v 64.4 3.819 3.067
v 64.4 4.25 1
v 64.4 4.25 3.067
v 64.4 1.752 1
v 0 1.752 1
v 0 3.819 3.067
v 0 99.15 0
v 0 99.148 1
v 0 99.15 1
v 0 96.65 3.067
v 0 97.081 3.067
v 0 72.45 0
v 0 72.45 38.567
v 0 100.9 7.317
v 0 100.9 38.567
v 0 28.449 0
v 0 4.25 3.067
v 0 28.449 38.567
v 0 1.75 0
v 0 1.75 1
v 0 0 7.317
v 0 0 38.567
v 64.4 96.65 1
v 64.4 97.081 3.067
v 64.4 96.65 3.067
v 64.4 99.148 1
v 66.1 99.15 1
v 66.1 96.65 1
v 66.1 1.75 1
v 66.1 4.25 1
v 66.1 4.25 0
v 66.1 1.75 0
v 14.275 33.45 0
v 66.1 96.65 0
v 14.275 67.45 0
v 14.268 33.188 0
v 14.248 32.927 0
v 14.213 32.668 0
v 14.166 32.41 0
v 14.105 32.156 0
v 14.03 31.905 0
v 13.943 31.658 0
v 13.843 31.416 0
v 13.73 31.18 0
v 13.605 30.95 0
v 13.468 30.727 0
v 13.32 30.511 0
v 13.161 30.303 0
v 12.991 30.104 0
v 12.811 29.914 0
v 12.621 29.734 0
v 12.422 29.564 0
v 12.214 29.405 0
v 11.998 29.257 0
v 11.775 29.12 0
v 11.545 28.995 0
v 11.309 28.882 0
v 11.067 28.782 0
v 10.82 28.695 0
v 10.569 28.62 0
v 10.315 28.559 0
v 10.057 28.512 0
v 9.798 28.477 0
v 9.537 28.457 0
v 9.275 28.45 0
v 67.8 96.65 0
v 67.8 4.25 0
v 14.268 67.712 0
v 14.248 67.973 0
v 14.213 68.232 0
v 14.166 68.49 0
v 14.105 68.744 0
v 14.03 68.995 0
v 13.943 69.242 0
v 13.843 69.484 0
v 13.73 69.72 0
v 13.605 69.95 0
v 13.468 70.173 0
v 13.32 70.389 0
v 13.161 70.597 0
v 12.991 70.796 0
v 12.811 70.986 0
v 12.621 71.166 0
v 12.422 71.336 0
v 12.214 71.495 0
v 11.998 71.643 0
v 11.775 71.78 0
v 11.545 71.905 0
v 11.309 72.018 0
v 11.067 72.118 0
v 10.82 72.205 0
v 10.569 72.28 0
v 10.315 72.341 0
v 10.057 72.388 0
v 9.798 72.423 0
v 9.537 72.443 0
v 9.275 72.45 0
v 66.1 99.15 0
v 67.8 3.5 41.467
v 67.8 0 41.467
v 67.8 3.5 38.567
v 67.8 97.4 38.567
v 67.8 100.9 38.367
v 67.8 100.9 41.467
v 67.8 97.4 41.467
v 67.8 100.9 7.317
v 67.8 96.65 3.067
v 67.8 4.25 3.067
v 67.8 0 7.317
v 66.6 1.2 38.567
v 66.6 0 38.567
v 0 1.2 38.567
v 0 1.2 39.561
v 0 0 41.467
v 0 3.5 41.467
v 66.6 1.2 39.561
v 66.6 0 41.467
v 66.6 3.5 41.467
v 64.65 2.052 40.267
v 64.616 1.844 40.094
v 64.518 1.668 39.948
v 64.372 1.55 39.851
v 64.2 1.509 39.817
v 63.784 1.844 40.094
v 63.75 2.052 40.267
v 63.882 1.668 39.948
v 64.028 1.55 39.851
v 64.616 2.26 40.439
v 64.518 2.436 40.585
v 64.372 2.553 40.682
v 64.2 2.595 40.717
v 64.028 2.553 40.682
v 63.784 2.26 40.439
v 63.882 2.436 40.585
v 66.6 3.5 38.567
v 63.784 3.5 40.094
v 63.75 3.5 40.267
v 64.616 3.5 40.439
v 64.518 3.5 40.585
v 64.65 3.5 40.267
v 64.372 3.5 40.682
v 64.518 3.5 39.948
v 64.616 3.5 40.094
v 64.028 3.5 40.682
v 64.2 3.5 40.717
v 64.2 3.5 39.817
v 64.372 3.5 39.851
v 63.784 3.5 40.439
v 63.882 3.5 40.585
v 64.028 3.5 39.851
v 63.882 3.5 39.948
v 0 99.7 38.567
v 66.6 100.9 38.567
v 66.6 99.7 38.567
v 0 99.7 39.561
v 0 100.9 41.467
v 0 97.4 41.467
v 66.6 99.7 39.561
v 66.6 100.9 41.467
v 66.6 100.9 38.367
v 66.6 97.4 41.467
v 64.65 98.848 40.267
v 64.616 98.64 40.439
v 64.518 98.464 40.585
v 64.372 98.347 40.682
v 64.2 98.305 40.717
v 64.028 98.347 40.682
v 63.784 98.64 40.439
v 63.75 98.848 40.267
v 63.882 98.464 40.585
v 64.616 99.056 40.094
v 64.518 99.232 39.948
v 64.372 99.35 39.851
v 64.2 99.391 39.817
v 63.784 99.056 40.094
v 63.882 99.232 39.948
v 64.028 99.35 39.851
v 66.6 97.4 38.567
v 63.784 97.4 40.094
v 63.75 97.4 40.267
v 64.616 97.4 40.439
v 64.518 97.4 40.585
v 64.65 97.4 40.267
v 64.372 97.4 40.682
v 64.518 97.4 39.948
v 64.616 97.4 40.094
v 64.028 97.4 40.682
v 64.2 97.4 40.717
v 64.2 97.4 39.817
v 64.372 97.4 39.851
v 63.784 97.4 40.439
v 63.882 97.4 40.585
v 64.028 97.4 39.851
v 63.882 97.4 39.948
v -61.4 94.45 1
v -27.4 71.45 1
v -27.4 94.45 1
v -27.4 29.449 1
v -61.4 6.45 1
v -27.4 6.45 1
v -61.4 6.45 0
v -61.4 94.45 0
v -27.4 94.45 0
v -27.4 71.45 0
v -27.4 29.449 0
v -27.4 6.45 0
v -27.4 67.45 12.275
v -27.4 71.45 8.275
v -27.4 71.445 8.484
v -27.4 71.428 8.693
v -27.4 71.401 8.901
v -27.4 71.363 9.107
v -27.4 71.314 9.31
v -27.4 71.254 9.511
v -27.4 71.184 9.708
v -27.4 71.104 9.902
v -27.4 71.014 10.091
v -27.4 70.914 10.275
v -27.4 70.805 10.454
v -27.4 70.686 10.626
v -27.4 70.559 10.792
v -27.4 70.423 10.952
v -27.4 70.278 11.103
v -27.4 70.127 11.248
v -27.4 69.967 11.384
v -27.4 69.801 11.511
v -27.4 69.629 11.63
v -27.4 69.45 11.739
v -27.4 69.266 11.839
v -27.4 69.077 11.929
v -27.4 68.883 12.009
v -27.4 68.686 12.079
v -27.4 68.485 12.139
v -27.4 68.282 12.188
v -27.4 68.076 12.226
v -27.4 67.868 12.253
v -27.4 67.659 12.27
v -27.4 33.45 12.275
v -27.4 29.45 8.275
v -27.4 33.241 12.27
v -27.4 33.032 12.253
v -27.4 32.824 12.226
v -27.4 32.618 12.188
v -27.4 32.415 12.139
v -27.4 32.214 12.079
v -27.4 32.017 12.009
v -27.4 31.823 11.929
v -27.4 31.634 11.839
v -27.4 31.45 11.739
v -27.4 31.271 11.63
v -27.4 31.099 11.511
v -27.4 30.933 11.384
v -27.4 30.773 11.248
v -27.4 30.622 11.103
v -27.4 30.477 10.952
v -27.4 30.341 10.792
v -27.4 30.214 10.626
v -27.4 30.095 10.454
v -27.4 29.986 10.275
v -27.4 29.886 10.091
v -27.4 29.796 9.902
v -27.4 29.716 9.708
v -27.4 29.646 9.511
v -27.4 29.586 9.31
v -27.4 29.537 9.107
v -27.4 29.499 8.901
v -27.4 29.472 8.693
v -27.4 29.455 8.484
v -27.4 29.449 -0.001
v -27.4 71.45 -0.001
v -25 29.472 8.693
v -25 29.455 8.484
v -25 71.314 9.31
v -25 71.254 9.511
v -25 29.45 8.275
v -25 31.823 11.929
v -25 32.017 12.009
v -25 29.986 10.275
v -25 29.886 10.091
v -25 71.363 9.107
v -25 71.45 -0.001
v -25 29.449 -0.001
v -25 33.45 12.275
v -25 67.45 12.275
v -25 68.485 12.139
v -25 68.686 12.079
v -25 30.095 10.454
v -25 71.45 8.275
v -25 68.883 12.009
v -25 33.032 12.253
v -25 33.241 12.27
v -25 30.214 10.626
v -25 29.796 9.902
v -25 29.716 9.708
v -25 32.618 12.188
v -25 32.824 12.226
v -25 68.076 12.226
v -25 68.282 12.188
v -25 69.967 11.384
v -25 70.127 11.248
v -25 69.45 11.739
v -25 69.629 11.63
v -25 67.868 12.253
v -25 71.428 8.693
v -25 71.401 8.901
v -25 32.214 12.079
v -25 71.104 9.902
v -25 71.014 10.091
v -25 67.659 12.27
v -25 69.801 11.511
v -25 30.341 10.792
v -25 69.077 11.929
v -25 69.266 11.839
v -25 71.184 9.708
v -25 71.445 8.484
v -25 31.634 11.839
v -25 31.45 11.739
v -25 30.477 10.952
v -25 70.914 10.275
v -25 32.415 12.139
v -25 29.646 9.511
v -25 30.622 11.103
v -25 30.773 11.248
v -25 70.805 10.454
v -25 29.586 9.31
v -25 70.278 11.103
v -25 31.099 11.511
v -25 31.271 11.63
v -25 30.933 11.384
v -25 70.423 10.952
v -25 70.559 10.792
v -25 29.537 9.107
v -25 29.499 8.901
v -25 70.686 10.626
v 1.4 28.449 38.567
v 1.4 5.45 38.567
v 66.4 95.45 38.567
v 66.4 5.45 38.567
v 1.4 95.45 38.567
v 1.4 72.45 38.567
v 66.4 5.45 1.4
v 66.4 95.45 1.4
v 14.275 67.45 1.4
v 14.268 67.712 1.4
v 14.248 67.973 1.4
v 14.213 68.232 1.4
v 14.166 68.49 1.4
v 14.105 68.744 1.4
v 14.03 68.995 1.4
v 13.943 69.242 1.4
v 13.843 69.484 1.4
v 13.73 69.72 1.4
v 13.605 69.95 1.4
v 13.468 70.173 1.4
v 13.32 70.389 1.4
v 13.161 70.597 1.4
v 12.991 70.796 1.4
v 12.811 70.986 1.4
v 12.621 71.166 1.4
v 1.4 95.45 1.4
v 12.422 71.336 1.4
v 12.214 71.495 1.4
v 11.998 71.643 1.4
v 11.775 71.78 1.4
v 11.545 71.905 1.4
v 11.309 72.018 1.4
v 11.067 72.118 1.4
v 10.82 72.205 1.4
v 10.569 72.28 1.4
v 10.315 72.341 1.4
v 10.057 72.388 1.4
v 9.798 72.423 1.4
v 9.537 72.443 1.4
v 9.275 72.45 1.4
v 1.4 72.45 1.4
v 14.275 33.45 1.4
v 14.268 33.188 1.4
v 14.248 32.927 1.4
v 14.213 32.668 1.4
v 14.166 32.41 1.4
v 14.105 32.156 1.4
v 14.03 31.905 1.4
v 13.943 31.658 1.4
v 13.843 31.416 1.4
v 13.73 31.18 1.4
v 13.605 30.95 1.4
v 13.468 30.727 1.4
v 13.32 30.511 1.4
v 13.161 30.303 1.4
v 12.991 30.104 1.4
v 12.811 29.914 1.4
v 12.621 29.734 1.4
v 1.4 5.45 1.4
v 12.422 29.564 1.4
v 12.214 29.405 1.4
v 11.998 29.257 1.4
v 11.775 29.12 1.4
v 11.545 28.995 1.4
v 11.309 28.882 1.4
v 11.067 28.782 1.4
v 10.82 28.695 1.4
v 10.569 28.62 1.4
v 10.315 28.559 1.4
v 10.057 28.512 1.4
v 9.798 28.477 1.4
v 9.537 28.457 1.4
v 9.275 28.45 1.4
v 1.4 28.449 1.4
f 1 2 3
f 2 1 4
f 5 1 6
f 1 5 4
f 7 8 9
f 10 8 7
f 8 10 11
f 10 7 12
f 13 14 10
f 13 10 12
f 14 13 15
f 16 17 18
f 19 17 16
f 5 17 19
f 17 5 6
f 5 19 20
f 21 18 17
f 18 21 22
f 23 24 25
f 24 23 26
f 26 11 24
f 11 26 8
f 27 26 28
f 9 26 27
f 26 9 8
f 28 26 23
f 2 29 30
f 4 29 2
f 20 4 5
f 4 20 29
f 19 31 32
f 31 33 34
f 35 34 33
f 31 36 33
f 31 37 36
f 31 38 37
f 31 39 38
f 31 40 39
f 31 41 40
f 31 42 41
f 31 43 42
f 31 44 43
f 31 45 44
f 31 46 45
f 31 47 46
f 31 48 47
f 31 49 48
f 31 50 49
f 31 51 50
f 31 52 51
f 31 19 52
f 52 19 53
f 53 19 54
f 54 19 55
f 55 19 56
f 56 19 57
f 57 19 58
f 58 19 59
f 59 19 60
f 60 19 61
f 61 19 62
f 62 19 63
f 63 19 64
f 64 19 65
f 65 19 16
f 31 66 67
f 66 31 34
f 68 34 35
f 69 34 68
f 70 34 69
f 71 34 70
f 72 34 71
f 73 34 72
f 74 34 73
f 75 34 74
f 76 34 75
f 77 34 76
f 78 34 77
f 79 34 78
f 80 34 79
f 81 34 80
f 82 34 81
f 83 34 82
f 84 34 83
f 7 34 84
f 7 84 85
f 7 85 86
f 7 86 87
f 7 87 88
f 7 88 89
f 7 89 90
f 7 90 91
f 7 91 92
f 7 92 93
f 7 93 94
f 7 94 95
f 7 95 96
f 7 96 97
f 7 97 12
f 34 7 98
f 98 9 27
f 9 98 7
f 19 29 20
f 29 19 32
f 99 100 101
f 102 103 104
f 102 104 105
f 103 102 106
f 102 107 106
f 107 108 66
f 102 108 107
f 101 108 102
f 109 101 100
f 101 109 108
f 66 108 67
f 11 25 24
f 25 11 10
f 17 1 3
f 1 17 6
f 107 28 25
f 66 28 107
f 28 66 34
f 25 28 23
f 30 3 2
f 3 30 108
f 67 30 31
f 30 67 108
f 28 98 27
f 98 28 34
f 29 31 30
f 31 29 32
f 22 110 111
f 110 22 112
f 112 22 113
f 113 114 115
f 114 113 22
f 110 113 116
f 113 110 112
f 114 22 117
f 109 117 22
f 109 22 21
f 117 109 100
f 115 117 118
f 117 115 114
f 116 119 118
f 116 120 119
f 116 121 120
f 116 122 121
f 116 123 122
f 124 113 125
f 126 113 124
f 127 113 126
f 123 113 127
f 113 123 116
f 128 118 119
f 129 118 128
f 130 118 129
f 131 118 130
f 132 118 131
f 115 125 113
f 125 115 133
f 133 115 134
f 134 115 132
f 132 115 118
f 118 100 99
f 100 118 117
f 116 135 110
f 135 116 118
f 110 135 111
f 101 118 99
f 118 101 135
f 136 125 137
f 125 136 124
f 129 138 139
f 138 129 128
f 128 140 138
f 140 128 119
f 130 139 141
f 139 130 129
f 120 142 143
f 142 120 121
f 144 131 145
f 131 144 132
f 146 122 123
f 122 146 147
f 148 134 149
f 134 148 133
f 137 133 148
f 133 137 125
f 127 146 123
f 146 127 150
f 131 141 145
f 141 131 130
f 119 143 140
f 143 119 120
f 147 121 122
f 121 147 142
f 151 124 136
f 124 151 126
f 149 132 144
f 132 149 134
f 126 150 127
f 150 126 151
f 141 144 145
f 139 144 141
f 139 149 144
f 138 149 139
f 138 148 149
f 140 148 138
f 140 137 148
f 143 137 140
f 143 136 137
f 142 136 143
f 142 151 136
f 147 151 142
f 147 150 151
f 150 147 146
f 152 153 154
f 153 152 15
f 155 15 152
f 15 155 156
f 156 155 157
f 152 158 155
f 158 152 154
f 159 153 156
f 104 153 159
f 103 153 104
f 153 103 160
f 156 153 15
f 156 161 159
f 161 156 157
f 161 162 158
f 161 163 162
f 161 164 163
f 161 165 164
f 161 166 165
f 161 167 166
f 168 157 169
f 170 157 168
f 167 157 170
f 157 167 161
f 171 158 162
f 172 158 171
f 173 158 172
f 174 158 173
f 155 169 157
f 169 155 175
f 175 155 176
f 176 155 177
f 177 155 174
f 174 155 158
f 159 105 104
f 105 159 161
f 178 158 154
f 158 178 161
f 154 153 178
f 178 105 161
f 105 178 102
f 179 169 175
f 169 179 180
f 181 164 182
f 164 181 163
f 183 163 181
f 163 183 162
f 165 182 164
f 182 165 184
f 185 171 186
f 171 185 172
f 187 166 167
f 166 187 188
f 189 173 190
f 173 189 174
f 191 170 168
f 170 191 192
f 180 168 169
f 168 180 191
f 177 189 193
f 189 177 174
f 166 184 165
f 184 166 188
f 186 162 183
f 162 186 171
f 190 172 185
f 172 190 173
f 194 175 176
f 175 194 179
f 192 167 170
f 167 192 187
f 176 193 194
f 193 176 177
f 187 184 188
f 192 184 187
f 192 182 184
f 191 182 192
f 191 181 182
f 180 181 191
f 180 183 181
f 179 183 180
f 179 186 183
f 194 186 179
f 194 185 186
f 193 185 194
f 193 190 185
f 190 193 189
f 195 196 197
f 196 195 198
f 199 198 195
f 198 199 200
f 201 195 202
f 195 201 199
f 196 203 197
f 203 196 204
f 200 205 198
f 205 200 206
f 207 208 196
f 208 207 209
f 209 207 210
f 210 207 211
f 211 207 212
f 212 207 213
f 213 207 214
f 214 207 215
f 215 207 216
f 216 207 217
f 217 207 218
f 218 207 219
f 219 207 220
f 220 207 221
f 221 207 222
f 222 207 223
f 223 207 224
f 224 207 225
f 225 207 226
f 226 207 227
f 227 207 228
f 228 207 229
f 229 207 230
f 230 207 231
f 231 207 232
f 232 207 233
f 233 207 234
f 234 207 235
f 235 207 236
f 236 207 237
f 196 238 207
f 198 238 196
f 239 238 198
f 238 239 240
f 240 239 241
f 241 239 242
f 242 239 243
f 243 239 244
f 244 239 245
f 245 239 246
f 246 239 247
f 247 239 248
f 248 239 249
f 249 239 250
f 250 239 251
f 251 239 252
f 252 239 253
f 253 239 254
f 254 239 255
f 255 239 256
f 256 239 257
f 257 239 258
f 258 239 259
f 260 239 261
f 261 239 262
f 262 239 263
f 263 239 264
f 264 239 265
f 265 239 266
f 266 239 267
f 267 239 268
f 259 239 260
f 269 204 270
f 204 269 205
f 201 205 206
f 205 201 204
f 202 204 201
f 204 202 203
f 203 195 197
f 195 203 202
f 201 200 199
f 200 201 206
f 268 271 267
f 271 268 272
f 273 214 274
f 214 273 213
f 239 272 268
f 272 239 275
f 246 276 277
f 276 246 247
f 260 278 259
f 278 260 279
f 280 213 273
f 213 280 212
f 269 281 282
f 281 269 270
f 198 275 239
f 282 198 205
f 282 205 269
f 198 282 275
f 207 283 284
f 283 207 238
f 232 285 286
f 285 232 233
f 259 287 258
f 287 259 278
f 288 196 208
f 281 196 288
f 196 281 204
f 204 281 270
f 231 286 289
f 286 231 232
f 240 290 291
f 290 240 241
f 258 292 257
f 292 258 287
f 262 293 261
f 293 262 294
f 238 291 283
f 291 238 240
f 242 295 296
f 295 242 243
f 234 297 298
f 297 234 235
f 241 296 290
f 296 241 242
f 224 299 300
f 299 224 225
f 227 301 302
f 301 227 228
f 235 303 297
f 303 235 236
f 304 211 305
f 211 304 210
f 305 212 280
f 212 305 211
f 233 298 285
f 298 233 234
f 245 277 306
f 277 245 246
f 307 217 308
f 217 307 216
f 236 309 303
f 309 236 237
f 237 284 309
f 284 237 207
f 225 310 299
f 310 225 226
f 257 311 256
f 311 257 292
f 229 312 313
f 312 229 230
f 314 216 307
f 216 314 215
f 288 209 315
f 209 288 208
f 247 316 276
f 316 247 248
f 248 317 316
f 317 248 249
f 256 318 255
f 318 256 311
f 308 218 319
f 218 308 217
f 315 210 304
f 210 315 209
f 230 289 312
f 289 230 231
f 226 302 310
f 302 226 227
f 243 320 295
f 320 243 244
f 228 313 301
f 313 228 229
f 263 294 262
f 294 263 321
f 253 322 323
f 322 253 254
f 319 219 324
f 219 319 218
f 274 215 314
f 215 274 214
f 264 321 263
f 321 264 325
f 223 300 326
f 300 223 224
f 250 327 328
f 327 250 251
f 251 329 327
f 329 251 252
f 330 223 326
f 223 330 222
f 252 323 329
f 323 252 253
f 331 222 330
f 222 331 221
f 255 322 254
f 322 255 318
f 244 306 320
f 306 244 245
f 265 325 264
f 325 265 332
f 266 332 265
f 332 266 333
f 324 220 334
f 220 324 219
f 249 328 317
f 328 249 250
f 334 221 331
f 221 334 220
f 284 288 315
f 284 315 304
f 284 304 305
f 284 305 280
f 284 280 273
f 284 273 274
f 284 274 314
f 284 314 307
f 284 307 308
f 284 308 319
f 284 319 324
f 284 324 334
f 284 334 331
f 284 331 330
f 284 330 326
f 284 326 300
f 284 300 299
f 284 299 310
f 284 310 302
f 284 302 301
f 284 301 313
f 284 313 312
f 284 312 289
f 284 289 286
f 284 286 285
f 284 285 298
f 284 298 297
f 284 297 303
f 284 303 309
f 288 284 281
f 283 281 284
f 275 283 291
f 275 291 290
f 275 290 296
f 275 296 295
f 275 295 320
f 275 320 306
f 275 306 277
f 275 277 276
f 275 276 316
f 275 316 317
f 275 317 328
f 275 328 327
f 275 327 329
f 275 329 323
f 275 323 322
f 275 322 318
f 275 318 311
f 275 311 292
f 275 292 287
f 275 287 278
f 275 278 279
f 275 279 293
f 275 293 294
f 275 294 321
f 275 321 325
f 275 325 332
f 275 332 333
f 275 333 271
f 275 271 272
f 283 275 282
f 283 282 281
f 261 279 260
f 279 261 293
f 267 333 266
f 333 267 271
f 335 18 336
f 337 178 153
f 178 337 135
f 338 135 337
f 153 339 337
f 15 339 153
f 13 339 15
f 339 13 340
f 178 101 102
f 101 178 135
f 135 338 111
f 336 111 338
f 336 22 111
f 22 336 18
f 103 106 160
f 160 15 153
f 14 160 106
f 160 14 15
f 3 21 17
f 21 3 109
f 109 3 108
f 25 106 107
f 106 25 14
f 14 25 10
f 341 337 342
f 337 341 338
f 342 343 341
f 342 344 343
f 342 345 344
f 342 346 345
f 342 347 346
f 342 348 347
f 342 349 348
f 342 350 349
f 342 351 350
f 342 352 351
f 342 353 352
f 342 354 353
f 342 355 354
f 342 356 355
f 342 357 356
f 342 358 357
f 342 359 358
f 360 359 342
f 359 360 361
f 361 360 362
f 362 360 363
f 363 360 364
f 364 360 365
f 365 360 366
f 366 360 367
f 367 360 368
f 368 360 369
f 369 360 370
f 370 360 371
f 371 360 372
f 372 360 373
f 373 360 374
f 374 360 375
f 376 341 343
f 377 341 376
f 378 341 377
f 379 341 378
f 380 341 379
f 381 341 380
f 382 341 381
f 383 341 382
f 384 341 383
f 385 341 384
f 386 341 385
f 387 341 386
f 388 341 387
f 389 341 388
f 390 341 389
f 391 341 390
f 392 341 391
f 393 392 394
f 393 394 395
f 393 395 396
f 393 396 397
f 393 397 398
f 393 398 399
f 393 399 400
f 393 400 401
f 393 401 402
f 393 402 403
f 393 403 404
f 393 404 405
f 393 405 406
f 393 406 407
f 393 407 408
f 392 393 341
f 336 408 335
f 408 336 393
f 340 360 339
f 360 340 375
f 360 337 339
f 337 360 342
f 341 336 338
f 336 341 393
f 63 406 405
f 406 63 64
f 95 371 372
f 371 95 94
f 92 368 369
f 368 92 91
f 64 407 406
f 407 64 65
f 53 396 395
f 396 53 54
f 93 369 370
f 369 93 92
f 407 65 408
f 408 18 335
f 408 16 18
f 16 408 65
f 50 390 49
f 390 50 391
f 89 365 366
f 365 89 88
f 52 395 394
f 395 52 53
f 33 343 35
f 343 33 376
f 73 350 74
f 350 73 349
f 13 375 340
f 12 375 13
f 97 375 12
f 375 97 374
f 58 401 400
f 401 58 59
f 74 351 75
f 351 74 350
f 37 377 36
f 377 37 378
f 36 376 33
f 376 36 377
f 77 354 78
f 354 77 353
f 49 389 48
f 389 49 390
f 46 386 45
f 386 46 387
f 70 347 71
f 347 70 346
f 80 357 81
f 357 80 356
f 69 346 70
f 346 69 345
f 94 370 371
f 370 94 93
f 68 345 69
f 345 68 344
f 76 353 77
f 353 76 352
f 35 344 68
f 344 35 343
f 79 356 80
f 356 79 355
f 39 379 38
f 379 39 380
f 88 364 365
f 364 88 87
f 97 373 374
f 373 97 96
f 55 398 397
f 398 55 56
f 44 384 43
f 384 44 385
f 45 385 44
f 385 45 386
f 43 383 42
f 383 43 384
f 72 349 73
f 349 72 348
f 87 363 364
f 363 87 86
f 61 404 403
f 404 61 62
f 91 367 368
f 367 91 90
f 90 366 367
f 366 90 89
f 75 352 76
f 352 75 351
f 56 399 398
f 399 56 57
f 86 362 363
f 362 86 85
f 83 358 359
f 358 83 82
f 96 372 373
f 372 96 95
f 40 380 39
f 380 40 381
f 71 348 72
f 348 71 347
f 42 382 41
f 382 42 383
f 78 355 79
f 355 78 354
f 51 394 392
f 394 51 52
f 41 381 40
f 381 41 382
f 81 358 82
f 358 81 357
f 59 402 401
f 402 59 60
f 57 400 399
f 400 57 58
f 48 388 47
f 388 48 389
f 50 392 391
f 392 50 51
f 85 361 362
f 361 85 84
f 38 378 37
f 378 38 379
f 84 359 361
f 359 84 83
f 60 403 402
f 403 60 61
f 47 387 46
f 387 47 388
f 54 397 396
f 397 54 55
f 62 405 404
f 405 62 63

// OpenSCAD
/*
 * Customizable Card Boxes and Lids 
 * Version: 0.4 -- 2019-01-14
 * Author: Mark Phaedrus
 * License: Creative Commons Attribution-ShareAlike 3.0 Unported License
 *          see http://creativecommons.org/licenses/by-sa/3.0/
 * URL:     https://www.thingiverse.com/thing:2954310
 
 * Remix Of: Customizable Board Game Card Storage with Multiple Sizes
 * Author:  Erwan Loisant
 * License: Creative Commons Attribution-ShareAlike 3.0 Unported License
 *          see http://creativecommons.org/licenses/by-sa/3.0/
 * URL:     https://www.thingiverse.com/thing:2923849
 * 
 * Remix Of: Customizable Board Game Card Storage
 * Author:  Jean Philippe Neumann
 * License: Creative Commons Attribution-ShareAlike 3.0 Unported License
 *          see http://creativecommons.org/licenses/by-sa/3.0/
 * URL:     http://www.thingiverse.com/thing:94611
 */
 
// MakerBot customizer settings:
// preview[view:south east, tilt:top diagonal]

/*
 * parameters
 */

/* [Basics] */

// What is the length of your cards (the longer dimension) in millimeters?
cardLength = 88;
// What is the width of your cards in millimeters?
cardWidth = 63;

// How should I position the boxes for printing? Printing them flat lets them print without support (if you use the angled lock). Standing them on their sides will let you fit more boxes on the build plate, but requires a lot of support.
boxPositioning = 0; // [0:Flat,1:On their sides]

// What style of lock should I use to let the boxes be stacked together and keep the lids on? The square lock uses 90-degree angles; it's strong, but winds up looking messy (or requires support) if you print the boxes flat. The angled lock is experimental and a bit weaker; but it's strong enough for most uses, and it can be printed without support in either position.
lockStyle = 1; // [0: Square lock,1:Angled lock] 

// How tightly should the boxes and lids fit together? The right value is highly dependent on your printer. Start with a value of 0. Are the locks too tight to slide together? Try decreasing the tightness by 1. Are the locks so loose that they slide apart on their own? Try increasing the tightness by 1.
fitTightness = 0; // [-5:1:5]

// What is the thickness of the stack of cards you're keeping in the first box, in millimeters?
cardBox1Thickness = 35;

// Should the box have a grab hole in the side to let you draw cards from the box? If so, do you also want a plug to cover the grab hole for storage?
cardBox1GrabHole = 2; // [2:Hole with plug,1:Hole without plug,0:No]

// What label should I put on the two narrow ends of the first box? (Leave this blank if you don't want a label there.)
cardBox1EndLabel = "";

// What label should I put on the long side of the first box opposite the grab hole? (Leave this blank if you don't want a label there.)
cardBox1SideLabel = "";

// Should the first card box have a key on the bottom? (Choosing this will make the box simpler, but won't let you lock any other boxes to the bottom of this one.)
cardBox1Key = 1; // [1:Bottom key,0:No bottom key]

// What label should I put on the lid? (Leave this blank if you don't want a label.)
lidLabel = "";

// What part should be displayed in the preview?
part="B1"; // [B1:Box 1,L1:Lid,B2:Box 2,B3:Box 3,B4:Box 4,B5:Box 5]

/* [Box 2 (if you want it)] */

// What is the thickness of the stack of cards you're keeping in the second box, in millimeters? (Leave this zero if you don't want a second box.)
cardBox2Thickness = 0;

// Should the box have a grab hole in the side to let you draw cards from the box? If so, do you also want a plug to cover the grab hole for storage?
cardBox2GrabHole = 2; // [2:Hole with plug,1:Hole without plug,0:No]

// What label should I put on the two narrow ends of the second box? (Leave this blank if you don't want a label there.)
cardBox2EndLabel = "";

// What label should I put on the long side of the second box opposite the grab hole? (Leave this blank if you don't want a label there.)
cardBox2SideLabel = "";

// Should the box have a key on the bottom? (Choosing this will make the box simpler, but won't let you lock any other boxes to the bottom of this one.)
cardBox2Key = 1; // [1:Bottom key,0:No bottom key]

/* [Box 3 (if you want it)] */

// What is the thickness of the stack of cards you're keeping in the third box, in millimeters? (Leave this zero if you don't want a third box.)
cardBox3Thickness = 0;

// Should the box have a grab hole in the side to let you draw cards from the box? If so, do you also want a plug to cover the grab hole for storage?
cardBox3GrabHole = 2; // [2:Hole with plug,1:Hole without plug,0:No]

// What label should I put on the two narrow ends of the third box? (Leave this blank if you don't want a label there.)
cardBox3EndLabel = "";

// What label should I put on the long side of the third box opposite the grab hole? (Leave this blank if you don't want a label there.)
cardBox3SideLabel = "";

// Should the box have a key on the bottom? (Choosing this will make the box simpler, but won't let you lock any other boxes to the bottom of this one.)
cardBox3Key = 1; // [1:Bottom key,0:No bottom key]

/* [Box 4 (if you want it)] */

// What is the thickness of the stack of cards you're keeping in the fourth box, in millimeters? (Leave this zero if you don't want a fourth box.)
cardBox4Thickness = 0;

// Should the box have a grab hole in the side to let you draw cards from the box? If so, do you also want a plug to cover the grab hole for storage?
cardBox4GrabHole = 2; // [2:Hole with plug,1:Hole without plug,0:No]

// What label should I put on the two narrow ends of the fourth box? (Leave this blank if you don't want a label there.)
cardBox4EndLabel = "";

// What label should I put on the long side of the first box opposite the grab hole? (Leave this blank if you don't want a label there.)
cardBox4SideLabel = "";

// Should the box have a key on the bottom? (Choosing this will make the box simpler, but won't let you lock any other boxes to the bottom of this one.)
cardBox4Key = 1; // [1:Bottom key,0:No bottom key]

/* [Box 5 (if you want it)] */

// What is the thickness of the stack of cards you're keeping in the fifth box, in millimeters? (Leave this zero if you don't want a fifth box.)
cardBox5Thickness = 0;

// Should the box have a grab hole in the side to let you draw cards from the box? If so, do you also want a plug to cover the grab hole for storage?
cardBox5GrabHole = 2; // [2:Hole with plug,1:Hole without plug,0:No]

// What label should I put on the two narrow ends of the fifth box? H(Leave this blank if you don't want a label there.)
cardBox5EndLabel = "";

// What label should I put on the long side of the fifth box opposite the grab hole? (Leave this blank if you don't want a label.)
cardBox5SideLabel = "";

// Should the box have a key on the bottom? (Choosing this will make the box simpler, but won't let you lock any other boxes to the bottom of this one.)
cardBox5Key = 1; // [1:Bottom key,0:No bottom key]

// Hiding all the parameters below from the customizer for now, because I haven't verified that they all work correctly with the new lock/key style.
/* [Hidden] */

partType = part[0];
partIndex = atoi(part[1]) - 1;

longWallStrength = 1.4;
shortWallStrength = 1.2;
bottomWallStrength = 1.4;

// thickness of the lower part of the lock mechanism
lowerLockY = 1.2;
// height of the lower part of the lock mechanism
lowerLockZ = 1.7;
// thickness of the upper part of the lock mechanism
upperLockY = 3.5;
// height of the upper part of the lock mechanism
upperLockZ = 1.2;
// how high is the part of the lid that slides in the locks rail
keyRailZLid = 1.0;
// how high is the part of the holders body that slides in the locks rail
keyRailZBody = 1.0;

// How far the text on the lid is embedded into the lid
lidTextDepth = 0.8;

// How far the text on the boxes is embedded into the box
holderTextDepth = 1.2;

// how thick the bit of plastic is that blocks the end of the lock's rail
stopBitStrength = 1.2;
// the "lock nub" is a tiny bump near the end of the lock's rail that makes other holders or lids snap in. This variable sets the size of that nub.
lockNubRadius = 0.45;
// position of the "lock nub"
lockNubDistanceToCorner = 3*stopBitStrength;

// how much extra space to leave around cards
spaceAroundCard = 1;
// how strong the lid's grip is
lidGripStrength = 3;

// **********
// * BEGIN INCLUDED CODE:
// * DisplayErrorsInPreview by kickahaota (https://www.thingiverse.com/thing:2918930)
// **********
// Convert strings to floating point for compatibility with Customizer
// Conversion code by jesse (https://www.thingiverse.com/thing:2247435)
function atoi(str, base=10, i=0, nb=0) =
	i == len(str) ? (str[0] == "-" ? -nb : nb) :
	i == 0 && str[0] == "-" ? atoi(str, base, 1) :
	atoi(str, base, i + 1,
		nb + search(str[i], "0123456789ABCDEF")[0] * pow(base, len(str) - i - 1));

function substr(str, pos=0, len=-1, substr="") =
	len == 0 ? substr :
	len == -1 ? substr(str, pos, len(str)-pos, substr) :
	substr(str, pos+1, len-1, str(substr, str[pos]));
    
function atof(str) = len(str) == 0 ? 0 : let( expon1 = search("e", str), expon = len(expon1) ? expon1 : search("E", str)) len(expon) ? atof(substr(str,pos=0,len=expon[0])) * pow(10, atoi(substr(str,pos=expon[0]+1))) : let( multiplyBy = (str[0] == "-") ? -1 : 1, str = (str[0] == "-" || str[0] == "+") ? substr(str, 1, len(str)-1) : str, decimal = search(".", str), beforeDecimal = decimal == [] ? str : substr(str, 0, decimal[0]), afterDecimal = decimal == [] ? "0" : substr(str, decimal[0]+1) ) (multiplyBy * (atoi(beforeDecimal) + atoi(afterDecimal)/pow(10,len(afterDecimal)))); 

function isdef(x) = (x != undef);
function isnumeric(x) = isdef(x) && ( x + 0 == x);
function isinteger(x) = isdef(x) && ( floor(x) == x) ;
function aorftof(numorstr) = (numorstr + 1 == undef) ? atof(numorstr) : numorstr;
function aoritoi(numorstr) = (numorstr + 1 == undef) ? atoi(numorstr) : numorstr;

module showfailedassertions() {
    translate([0,0,0]) linear_extrude(height=1) text(text="Please make these parameter changes:");
    for(idx = [0 : len(assertions)-1]) {
        if (!assertions[idx][0]) {
            translate([0, -12*idx, 0]) linear_extrude(height=1) text(text=assertions[idx][1]);
        }
    }
}

function anyassertionfailed(idx = len(assertions)-1) = (!(assertions[idx][0]) ? 1 : (idx <= 0) ? 0 : anyassertionfailed(idx-1)); 

// **********
// * END INCLUDED CODE:
// * DisplayErrorsInPreview by kickahaota (https://www.thingiverse.com/thing:2918930)
// **********

// Customizer may have converted numeric parameters into strings; turn them back into numbers
cardY = aorftof(cardLength);
cardX = aorftof(cardWidth);
cardStackZs = [cardBox1Thickness,cardBox2Thickness,cardBox3Thickness,cardBox4Thickness,cardBox5Thickness];
holderEndLabels = [cardBox1EndLabel,cardBox2EndLabel,cardBox3EndLabel,cardBox4EndLabel,cardBox5EndLabel];
holderSideLabels = [cardBox1SideLabel,cardBox2SideLabel,cardBox3SideLabel,cardBox4SideLabel,cardBox5SideLabel];
holderUseGrabHoles = [(cardBox1GrabHole > 0), (cardBox2GrabHole > 0), (cardBox3GrabHole > 0), (cardBox4GrabHole > 0), (cardBox5GrabHole > 0)];
holderUseGrabHolePlugs = [(cardBox1GrabHole == 2), (cardBox2GrabHole == 2), (cardBox3GrabHole == 2), (cardBox4GrabHole == 2), (cardBox5GrabHole == 2)];
holderSuppressKeys = [(cardBox1Key == 0), (cardBox2Key == 0), (cardBox3Key == 0), (cardBox4Key == 0), (cardBox5Key == 0)];
lidLabels = [lidLabel];
holdersOnSide = (aoritoi(boxPositioning) > 0) ;
fudgeFactor = .5 - (aorftof(fitTightness) / 10);
useAngledLockKeyStyle = (aoritoi(lockStyle) > 0);

function isNumeric(x) = (abs(x) != undef);
function isString(x) = !isNumeric(x) && (str(x) == x);
function isVector(x) = !isNumeric(x) && !isString(x);

function valueFromOptionalArray(valueOrArray, idx) = isVector(valueOrArray)? valueOrArray[idx % len(valueOrArray)] : valueOrArray;
function cardStackZ(idxHolder) = valueFromOptionalArray(cardStackZs, idxHolder);
function holderEndLabel(idxLid) = valueFromOptionalArray(holderEndLabels, idxLid);
function holderSideLabel(idxLid) = valueFromOptionalArray(holderSideLabels, idxLid);
function lidLabel(idxLid) = valueFromOptionalArray(lidLabels, idxLid);

// Assertions we want to verify before making the real object
assertions = [
    [fudgeFactor >= 0, "Fit tightness must be at least zero" ],
    [fudgeFactor <= 1, "Fit tightness cannot be greater than one"],
    [cardY >= cardX, "Card length can't be less than card width"],
    [cardY >= 10, "Card length must be at least 10 millimeters"],
    [cardX >= 10, "Card width must be at least 10 millimeters"],
    [len(part) == 2, "Part code must have 2 characters"],
    [(partType == "B") || (partType == "L"), "First character of part code must be 'B' to print a box or 'L' to print a lid."],
    [(partIndex >= 0) && (partIndex <= 8), "Second character of part code must be a digit from 1 through 9."], 
    [(partType == "B") || (partType == "L"), "Part type is unexpected."],
];


// holder main body parameters
bodyX = cardX + 2*spaceAroundCard + 2*longWallStrength;
bodyY = cardY + 2*spaceAroundCard + 2*shortWallStrength + 2*upperLockY + 3*fudgeFactor;
function bodyZ(idxHolder) = cardStackZ(idxHolder) + spaceAroundCard/2;

// lock, key and lid parameters
lockZ = lowerLockZ + upperLockZ;
lidZ = lowerLockZ + upperLockZ - fudgeFactor;
keyRailX = bodyX - 2*stopBitStrength - 2*fudgeFactor;
keyRailY = upperLockY - lowerLockY + 0.7 - fudgeFactor;
keyMainY = cardY + 2*spaceAroundCard + 2*shortWallStrength;
// space around the card stack
cardSpaceX = cardX + 2*spaceAroundCard;
cardSpaceY = cardY + 2*spaceAroundCard;

// hole in the side of the holder
grabHoleX = longWallStrength + cardX/8;
grabHoleY = cardY * 1/2;
grabHoleCylinderRadius = 5;
// misc 
function keyZ(idxHolder) = holderSuppressKeys[idxHolder] ? 0 : (lowerLockZ + upperLockZ + fudgeFactor/3);
function holderZ(idxHolder) = bodyZ(idxHolder) + keyZ(idxHolder) + lockZ;
function maxHolderZ(idxHolder = len(cardStackZs)-1) = (idxHolder < 0) ? 0 : max(holderZ(idxHolder), maxHolderZ(idxHolder-1));

/*
 * modules
 */

module lid(idxLid) {
    lidHoleRadius = (cardX + 2*spaceAroundCard + 2*longWallStrength)/2 - lidGripStrength;
    lidHoleBarY = lidGripStrength;
    lidHolePlugRadius = lidHoleRadius - 2;
    lidHolePlugThickness = max(1.2, lidZ * 2 / 3);
    lidHolePlugGapX = 2 * (lidHolePlugRadius * .75);
    lidHolePlugGapY = 4 * lidHoleBarY;


    textxsize = min(bodyX*.9, 12 * len(lidLabel(idxLid)));
    textysize = 12;
    difference() {
        union() {
            difference() {
                key(bodyX, keyMainY, lidZ, keyRailX, keyRailY, keyRailZLid, true);
            
                translate([bodyX/2, bodyY/2, -1])
                    cylinder(h=lidZ+2, r=lidHoleRadius, $fn=64);
            }
            translate([0, (bodyY-lidHoleBarY)/2,0])
                cube([bodyX, lidHoleBarY ,lidZ]);
            difference() {
                translate([bodyX/2, bodyY/2, 0])
                    cylinder(h=lidHolePlugThickness, r=lidHolePlugRadius, $fn=64);
                translate([(bodyX - lidHolePlugGapX) / 2,
                           (bodyY - lidHolePlugGapY) / 2, -1])
                    cube([lidHolePlugGapX, lidHolePlugGapY, lidZ+2]);
            }
            
        }
        translate([bodyX/2, 5, lidZ-lidTextDepth])
            resize([textxsize, textysize, 0], auto=false)     
                linear_extrude(height = lidTextDepth + 0.001)
                    text(text=lidLabel(idxLid), size=10, valign="bottom", halign="center");
    }

}

module key(mainX, mainY, mainZ, railX, railY, railZ, lidMode) {
	railPartY = 2*railY + mainY;
	
	translate([(bodyX-mainX)/2, (bodyY-mainY)/2,0])
	union() {
		// color([0.5,0.7,0.9])
            cube([mainX, mainY, mainZ]);
		
 		// color([0.7,0.7,0.9])
            translate([(mainX-railX)/2,(mainY-railPartY)/2,0])
                cube([railX, railPartY, railZ]);
		        
		if(lidMode == false)
        {
			// color([1,0,0])
            {
                translate([0, -(railPartY-mainY)/2, 0])
                {
                    cube([(mainX-railX)/2,railPartY,railZ]);
                    if (useAngledLockKeyStyle)
                    {
                        translate([railX,0.001,railZ - 0.001])
                        {
                            // color([0,0,0])
                            {   
                                rotate([0,270,0])
                                {
                                    linear_extrude(height=railX)
                                    {
                                        polygon([[0,0],[0,railY],[railY,railY]]);
                                    }
                                }
                            }
                        }
                        translate([railX, railPartY - 0.001, railZ - 0.001])
                        {
                            // color([0,0,0])
                            {   
                                rotate([0,270,0])
                                {
                                    linear_extrude(height=railX)
                                    {
                                        polygon([[0,0],[0,-railY],[railY,-railY]]);
                                    }
                                }
                            }
                        }
                        
                    }
                }
            }
		}
        else if (useAngledLockKeyStyle) 
        {
            size = railY;
            translate([(mainX+railX)/2,fudgeFactor-(mainX-railX),0])
            {
                // color([0,0,0])
                {   
                    rotate([0,270,0])
                    {
                        linear_extrude(height=railX)
                        {
                            polygon([[0,0],[0,size],[size,size]]);
                        }
                    }
                }
            }
            translate([(mainX+railX)/2, mainY - fudgeFactor + (mainX - railX),0])
            {
                // color([1,1,1])
                {   
                    rotate([0,270,0])
                    {
                        linear_extrude(height=railX)
                        {
                            polygon([[0,0],[0,-size],[size,-size]]);
                        }
                    }
                }
            }
        }
	}
}

module holder(idxHolder) {
	difference() {
		union() {
            if (!holderSuppressKeys[idxHolder])
            {
                key(bodyX, keyMainY, keyZ(idxHolder), keyRailX, keyRailY, keyRailZBody, false);
			}
			translate([0,0,keyZ(idxHolder)])
                cube([bodyX, bodyY, bodyZ(idxHolder)]);
			
			translate([0,0,bodyZ(idxHolder)+keyZ(idxHolder)])
                lock();
            
            color("Red") grabHolePlug(idxHolder);
		}
		cardSpace(idxHolder);
		grabHole(idxHolder);
        endLabel(idxHolder);
        sideLabel(idxHolder);
        if (!holderSuppressKeys[idxHolder])
        {
            if (useAngledLockKeyStyle)
            {
                size = (bodyY - keyMainY) / 2;
                translate([bodyX + 0.01,0,keyZ(idxHolder)])
                {
                    rotate([0, 270, 0])
                    {
                        linear_extrude(height=bodyX + 0.02)
                        {
                            polygon([[0,0], [size,0], [0, size]]);
                        }
                    }
                }
                translate([bodyX + 0.01, bodyY, keyZ(idxHolder)])
                {
                    rotate([0,270,0])
                    {
                        linear_extrude(height=bodyX + 0.02)
                        {
                            polygon([[0,0],[size,0],[0,-size]]);
                        }
                    }
                }
            }
        }
	}
}

module cardSpace(idxHolder) {
	// color([1,0,0])
        translate([(bodyX-cardSpaceX)/2,(bodyY-cardSpaceY)/2,bottomWallStrength])
            cube([cardSpaceX, cardSpaceY, bodyZ(idxHolder)+keyZ(idxHolder)+bottomWallStrength]);
}

function arccoords(startangle, step, endangle, xy_size, xoffset, yoffset)
    = ((step > 0 && startangle > endangle) || (step < 0 && startangle < endangle))
        ? []
        : concat([[xy_size * sin(startangle)+xoffset, xy_size * cos(startangle)+yoffset]],
                 arccoords(startangle+step, step, endangle, xy_size, xoffset, yoffset)); 


function grabHolePoly(shrinkage=0) = concat(
    [[-0.001, -0.001+shrinkage],
     [-0.001, grabHoleY-shrinkage],
     [grabHoleX - shrinkage, grabHoleY-shrinkage]],
    arccoords( 0, 3, 90,grabHoleCylinderRadius-shrinkage,grabHoleX-shrinkage,grabHoleY- grabHoleCylinderRadius),
    arccoords(90, 3,180,grabHoleCylinderRadius-shrinkage,grabHoleX-shrinkage,grabHoleCylinderRadius));

module grabHole(idxHolder) {
    cubeX = grabHoleX-grabHoleCylinderRadius;
    cubeY = grabHoleY-grabHoleCylinderRadius;
    posY = (bodyY-grabHoleY)/2;
    if (holderUseGrabHoles[idxHolder]) {
        $fn=64;
        translate([0, posY, -1]) {
            linear_extrude(height=bodyZ(idxHolder)+keyZ(idxHolder)+2)
            {
                polygon(grabHolePoly(0));
            }
        }
    }
    else
    {
        flexibilitySlitWidth = 2.0;
        translate([0, bodyY / 2, bottomWallStrength])
        {
            cube([longWallStrength, flexibilitySlitWidth, bodyZ(idxHolder) + lockZ + 0.001]);
        }
    }
}

module grabHolePlug(idxHolder) {
    shrinkage = 1; // 1.2 * fudgeFactor;
    plugInnerWallThickness = 1.0;
    posY = (bodyY-(grabHoleY))/2;
    plugPoly = grabHolePoly(shrinkage);
    echo(posY, bodyZ(idxHolder), plugPoly);
    if (holderUseGrabHolePlugs[idxHolder])
    {
        translate([-25,0,0])
        {
            rotate([0,270,0])
            {
                translate([0,(bodyY-cardSpaceY)/2 + shrinkage, bottomWallStrength + shrinkage])
                    cube([plugInnerWallThickness, cardSpaceY - (2 * shrinkage), cardStackZ(idxHolder) - shrinkage]);
             
                translate([0,posY,0])
                {
                    rotate([0, 0, 0])
                    {
                        linear_extrude(height=bottomWallStrength + shrinkage)
                        {
                            polygon(plugPoly);
                        }
                    }
                }
            }
        }
    }
}        

module endLabel(idxHolder)
{
    if (holderEndLabel(idxHolder) != "")
    {
        xsize = min(bodyX*.9, 12 * len(holderEndLabel(idxHolder)));
        ysize = min(bodyZ(idxHolder) / 2, 10);
        translate([bodyX / 2, holderTextDepth - 0.001, bodyZ(idxHolder) / 2 + lockZ + (useAngledLockKeyStyle ? 2.5 : 0)])
            rotate([90,0,0])
                resize([xsize, ysize, 0], auto=false)     
                    linear_extrude(height = holderTextDepth)
                        text(text=holderEndLabel(idxHolder), size=10, valign="center", halign="center");
        translate([bodyX / 2, bodyY - holderTextDepth + 0.001, bodyZ(idxHolder) / 2 + lockZ + (useAngledLockKeyStyle ? 2.5 : 0)])
            rotate([270, 180, 0])
                resize([xsize, ysize, 0], auto=false)     
                    linear_extrude(height = holderTextDepth)
                        text(text=holderEndLabel(idxHolder), size=10, valign="center", halign="center");
    }
}

module sideLabel(idxHolder)
{
    if (holderSideLabel(idxHolder) != "")
    {
        xsize = min(bodyY*.9, 12 * len(holderSideLabel(idxHolder)));
        ysize = min(bodyZ(idxHolder) / 2, 10);
        translate([bodyX - holderTextDepth + 0.001, bodyY / 2, bodyZ(idxHolder) / 2 + lockZ + (useAngledLockKeyStyle ? 2.5 : 0)])
            rotate([90,0,90])
                resize([xsize, ysize, 0], auto=false)     
                    linear_extrude(height = holderTextDepth)
                        text(text=holderSideLabel(idxHolder), size=10, valign="center", halign="center");
    }
}
        
module lock() {
	union() {
		lockPart();
		mirror([0,1,0]) {
			translate([0,-bodyY,0])
                lockPart();
		}
	}
}

module lockPart() {
	union() {
		// lower lock
		// color([0.9,0.4,0.3])
            cube([bodyX, lowerLockY, lowerLockZ]);
		
		// upper lock
		// subtracting 0.01 because of strange holes in the generated STL file
        if (useAngledLockKeyStyle)
        {
            // color([1,1,1])
                translate([bodyX,0,0])
                {
                    rotate([0,270,0])
                    {
                        linear_extrude(height=bodyX)
                        {
                            polygon([[0,0],
                                     [lowerLockZ + upperLockZ, 0],
                                     [lowerLockZ + upperLockZ, upperLockY]]);
                        }
                    }
                }
                    
        }
        else
        {
            translate([0,0,lowerLockZ-0.01])
                cube([bodyX, upperLockY, upperLockZ]);
		}
		// stop bit
		// color([0,1,0])
		// extra large lock bit / translate -Z because of strange holes in the generated STL file
            translate([bodyX-stopBitStrength, 0, -0.2])
                cube([stopBitStrength, upperLockY, lockZ+0.2]);
		
		// safety nub
		// color([1,0,0])
            translate([bodyX-lockNubDistanceToCorner, upperLockY, lowerLockZ])
                rotate([90,0,0])
                    cylinder(r=lockNubRadius, h=upperLockY, $fn=16);
	}
}

module unneededfile()
{
    rotate([45,0,45])
    {
        linear_extrude(height=1) text(text="This file is not used in this box set.");
        translate([0,-12,0]) linear_extrude(height=1) text(text="You can delete it.");
    };
}

/*
 * putting it all together
 */

if (anyassertionfailed())
{
    rotate([45,0,45]) showfailedassertions();
}
else
{
    if (partType == "B")
    {
        if ((partIndex < len(cardStackZs)) && (cardStackZs[partIndex] > 0))
        {
            if(holdersOnSide) {
                rotate([0, -90, 180])
                    holder(partIndex);
            } else {
                holder(partIndex);
            }
        }
        else unneededfile();
    }

    if(partType == "L") {
        if (partIndex < len(lidLabels))
        {
            lid(partIndex);
        }
        else unneededfile();
    }
}
